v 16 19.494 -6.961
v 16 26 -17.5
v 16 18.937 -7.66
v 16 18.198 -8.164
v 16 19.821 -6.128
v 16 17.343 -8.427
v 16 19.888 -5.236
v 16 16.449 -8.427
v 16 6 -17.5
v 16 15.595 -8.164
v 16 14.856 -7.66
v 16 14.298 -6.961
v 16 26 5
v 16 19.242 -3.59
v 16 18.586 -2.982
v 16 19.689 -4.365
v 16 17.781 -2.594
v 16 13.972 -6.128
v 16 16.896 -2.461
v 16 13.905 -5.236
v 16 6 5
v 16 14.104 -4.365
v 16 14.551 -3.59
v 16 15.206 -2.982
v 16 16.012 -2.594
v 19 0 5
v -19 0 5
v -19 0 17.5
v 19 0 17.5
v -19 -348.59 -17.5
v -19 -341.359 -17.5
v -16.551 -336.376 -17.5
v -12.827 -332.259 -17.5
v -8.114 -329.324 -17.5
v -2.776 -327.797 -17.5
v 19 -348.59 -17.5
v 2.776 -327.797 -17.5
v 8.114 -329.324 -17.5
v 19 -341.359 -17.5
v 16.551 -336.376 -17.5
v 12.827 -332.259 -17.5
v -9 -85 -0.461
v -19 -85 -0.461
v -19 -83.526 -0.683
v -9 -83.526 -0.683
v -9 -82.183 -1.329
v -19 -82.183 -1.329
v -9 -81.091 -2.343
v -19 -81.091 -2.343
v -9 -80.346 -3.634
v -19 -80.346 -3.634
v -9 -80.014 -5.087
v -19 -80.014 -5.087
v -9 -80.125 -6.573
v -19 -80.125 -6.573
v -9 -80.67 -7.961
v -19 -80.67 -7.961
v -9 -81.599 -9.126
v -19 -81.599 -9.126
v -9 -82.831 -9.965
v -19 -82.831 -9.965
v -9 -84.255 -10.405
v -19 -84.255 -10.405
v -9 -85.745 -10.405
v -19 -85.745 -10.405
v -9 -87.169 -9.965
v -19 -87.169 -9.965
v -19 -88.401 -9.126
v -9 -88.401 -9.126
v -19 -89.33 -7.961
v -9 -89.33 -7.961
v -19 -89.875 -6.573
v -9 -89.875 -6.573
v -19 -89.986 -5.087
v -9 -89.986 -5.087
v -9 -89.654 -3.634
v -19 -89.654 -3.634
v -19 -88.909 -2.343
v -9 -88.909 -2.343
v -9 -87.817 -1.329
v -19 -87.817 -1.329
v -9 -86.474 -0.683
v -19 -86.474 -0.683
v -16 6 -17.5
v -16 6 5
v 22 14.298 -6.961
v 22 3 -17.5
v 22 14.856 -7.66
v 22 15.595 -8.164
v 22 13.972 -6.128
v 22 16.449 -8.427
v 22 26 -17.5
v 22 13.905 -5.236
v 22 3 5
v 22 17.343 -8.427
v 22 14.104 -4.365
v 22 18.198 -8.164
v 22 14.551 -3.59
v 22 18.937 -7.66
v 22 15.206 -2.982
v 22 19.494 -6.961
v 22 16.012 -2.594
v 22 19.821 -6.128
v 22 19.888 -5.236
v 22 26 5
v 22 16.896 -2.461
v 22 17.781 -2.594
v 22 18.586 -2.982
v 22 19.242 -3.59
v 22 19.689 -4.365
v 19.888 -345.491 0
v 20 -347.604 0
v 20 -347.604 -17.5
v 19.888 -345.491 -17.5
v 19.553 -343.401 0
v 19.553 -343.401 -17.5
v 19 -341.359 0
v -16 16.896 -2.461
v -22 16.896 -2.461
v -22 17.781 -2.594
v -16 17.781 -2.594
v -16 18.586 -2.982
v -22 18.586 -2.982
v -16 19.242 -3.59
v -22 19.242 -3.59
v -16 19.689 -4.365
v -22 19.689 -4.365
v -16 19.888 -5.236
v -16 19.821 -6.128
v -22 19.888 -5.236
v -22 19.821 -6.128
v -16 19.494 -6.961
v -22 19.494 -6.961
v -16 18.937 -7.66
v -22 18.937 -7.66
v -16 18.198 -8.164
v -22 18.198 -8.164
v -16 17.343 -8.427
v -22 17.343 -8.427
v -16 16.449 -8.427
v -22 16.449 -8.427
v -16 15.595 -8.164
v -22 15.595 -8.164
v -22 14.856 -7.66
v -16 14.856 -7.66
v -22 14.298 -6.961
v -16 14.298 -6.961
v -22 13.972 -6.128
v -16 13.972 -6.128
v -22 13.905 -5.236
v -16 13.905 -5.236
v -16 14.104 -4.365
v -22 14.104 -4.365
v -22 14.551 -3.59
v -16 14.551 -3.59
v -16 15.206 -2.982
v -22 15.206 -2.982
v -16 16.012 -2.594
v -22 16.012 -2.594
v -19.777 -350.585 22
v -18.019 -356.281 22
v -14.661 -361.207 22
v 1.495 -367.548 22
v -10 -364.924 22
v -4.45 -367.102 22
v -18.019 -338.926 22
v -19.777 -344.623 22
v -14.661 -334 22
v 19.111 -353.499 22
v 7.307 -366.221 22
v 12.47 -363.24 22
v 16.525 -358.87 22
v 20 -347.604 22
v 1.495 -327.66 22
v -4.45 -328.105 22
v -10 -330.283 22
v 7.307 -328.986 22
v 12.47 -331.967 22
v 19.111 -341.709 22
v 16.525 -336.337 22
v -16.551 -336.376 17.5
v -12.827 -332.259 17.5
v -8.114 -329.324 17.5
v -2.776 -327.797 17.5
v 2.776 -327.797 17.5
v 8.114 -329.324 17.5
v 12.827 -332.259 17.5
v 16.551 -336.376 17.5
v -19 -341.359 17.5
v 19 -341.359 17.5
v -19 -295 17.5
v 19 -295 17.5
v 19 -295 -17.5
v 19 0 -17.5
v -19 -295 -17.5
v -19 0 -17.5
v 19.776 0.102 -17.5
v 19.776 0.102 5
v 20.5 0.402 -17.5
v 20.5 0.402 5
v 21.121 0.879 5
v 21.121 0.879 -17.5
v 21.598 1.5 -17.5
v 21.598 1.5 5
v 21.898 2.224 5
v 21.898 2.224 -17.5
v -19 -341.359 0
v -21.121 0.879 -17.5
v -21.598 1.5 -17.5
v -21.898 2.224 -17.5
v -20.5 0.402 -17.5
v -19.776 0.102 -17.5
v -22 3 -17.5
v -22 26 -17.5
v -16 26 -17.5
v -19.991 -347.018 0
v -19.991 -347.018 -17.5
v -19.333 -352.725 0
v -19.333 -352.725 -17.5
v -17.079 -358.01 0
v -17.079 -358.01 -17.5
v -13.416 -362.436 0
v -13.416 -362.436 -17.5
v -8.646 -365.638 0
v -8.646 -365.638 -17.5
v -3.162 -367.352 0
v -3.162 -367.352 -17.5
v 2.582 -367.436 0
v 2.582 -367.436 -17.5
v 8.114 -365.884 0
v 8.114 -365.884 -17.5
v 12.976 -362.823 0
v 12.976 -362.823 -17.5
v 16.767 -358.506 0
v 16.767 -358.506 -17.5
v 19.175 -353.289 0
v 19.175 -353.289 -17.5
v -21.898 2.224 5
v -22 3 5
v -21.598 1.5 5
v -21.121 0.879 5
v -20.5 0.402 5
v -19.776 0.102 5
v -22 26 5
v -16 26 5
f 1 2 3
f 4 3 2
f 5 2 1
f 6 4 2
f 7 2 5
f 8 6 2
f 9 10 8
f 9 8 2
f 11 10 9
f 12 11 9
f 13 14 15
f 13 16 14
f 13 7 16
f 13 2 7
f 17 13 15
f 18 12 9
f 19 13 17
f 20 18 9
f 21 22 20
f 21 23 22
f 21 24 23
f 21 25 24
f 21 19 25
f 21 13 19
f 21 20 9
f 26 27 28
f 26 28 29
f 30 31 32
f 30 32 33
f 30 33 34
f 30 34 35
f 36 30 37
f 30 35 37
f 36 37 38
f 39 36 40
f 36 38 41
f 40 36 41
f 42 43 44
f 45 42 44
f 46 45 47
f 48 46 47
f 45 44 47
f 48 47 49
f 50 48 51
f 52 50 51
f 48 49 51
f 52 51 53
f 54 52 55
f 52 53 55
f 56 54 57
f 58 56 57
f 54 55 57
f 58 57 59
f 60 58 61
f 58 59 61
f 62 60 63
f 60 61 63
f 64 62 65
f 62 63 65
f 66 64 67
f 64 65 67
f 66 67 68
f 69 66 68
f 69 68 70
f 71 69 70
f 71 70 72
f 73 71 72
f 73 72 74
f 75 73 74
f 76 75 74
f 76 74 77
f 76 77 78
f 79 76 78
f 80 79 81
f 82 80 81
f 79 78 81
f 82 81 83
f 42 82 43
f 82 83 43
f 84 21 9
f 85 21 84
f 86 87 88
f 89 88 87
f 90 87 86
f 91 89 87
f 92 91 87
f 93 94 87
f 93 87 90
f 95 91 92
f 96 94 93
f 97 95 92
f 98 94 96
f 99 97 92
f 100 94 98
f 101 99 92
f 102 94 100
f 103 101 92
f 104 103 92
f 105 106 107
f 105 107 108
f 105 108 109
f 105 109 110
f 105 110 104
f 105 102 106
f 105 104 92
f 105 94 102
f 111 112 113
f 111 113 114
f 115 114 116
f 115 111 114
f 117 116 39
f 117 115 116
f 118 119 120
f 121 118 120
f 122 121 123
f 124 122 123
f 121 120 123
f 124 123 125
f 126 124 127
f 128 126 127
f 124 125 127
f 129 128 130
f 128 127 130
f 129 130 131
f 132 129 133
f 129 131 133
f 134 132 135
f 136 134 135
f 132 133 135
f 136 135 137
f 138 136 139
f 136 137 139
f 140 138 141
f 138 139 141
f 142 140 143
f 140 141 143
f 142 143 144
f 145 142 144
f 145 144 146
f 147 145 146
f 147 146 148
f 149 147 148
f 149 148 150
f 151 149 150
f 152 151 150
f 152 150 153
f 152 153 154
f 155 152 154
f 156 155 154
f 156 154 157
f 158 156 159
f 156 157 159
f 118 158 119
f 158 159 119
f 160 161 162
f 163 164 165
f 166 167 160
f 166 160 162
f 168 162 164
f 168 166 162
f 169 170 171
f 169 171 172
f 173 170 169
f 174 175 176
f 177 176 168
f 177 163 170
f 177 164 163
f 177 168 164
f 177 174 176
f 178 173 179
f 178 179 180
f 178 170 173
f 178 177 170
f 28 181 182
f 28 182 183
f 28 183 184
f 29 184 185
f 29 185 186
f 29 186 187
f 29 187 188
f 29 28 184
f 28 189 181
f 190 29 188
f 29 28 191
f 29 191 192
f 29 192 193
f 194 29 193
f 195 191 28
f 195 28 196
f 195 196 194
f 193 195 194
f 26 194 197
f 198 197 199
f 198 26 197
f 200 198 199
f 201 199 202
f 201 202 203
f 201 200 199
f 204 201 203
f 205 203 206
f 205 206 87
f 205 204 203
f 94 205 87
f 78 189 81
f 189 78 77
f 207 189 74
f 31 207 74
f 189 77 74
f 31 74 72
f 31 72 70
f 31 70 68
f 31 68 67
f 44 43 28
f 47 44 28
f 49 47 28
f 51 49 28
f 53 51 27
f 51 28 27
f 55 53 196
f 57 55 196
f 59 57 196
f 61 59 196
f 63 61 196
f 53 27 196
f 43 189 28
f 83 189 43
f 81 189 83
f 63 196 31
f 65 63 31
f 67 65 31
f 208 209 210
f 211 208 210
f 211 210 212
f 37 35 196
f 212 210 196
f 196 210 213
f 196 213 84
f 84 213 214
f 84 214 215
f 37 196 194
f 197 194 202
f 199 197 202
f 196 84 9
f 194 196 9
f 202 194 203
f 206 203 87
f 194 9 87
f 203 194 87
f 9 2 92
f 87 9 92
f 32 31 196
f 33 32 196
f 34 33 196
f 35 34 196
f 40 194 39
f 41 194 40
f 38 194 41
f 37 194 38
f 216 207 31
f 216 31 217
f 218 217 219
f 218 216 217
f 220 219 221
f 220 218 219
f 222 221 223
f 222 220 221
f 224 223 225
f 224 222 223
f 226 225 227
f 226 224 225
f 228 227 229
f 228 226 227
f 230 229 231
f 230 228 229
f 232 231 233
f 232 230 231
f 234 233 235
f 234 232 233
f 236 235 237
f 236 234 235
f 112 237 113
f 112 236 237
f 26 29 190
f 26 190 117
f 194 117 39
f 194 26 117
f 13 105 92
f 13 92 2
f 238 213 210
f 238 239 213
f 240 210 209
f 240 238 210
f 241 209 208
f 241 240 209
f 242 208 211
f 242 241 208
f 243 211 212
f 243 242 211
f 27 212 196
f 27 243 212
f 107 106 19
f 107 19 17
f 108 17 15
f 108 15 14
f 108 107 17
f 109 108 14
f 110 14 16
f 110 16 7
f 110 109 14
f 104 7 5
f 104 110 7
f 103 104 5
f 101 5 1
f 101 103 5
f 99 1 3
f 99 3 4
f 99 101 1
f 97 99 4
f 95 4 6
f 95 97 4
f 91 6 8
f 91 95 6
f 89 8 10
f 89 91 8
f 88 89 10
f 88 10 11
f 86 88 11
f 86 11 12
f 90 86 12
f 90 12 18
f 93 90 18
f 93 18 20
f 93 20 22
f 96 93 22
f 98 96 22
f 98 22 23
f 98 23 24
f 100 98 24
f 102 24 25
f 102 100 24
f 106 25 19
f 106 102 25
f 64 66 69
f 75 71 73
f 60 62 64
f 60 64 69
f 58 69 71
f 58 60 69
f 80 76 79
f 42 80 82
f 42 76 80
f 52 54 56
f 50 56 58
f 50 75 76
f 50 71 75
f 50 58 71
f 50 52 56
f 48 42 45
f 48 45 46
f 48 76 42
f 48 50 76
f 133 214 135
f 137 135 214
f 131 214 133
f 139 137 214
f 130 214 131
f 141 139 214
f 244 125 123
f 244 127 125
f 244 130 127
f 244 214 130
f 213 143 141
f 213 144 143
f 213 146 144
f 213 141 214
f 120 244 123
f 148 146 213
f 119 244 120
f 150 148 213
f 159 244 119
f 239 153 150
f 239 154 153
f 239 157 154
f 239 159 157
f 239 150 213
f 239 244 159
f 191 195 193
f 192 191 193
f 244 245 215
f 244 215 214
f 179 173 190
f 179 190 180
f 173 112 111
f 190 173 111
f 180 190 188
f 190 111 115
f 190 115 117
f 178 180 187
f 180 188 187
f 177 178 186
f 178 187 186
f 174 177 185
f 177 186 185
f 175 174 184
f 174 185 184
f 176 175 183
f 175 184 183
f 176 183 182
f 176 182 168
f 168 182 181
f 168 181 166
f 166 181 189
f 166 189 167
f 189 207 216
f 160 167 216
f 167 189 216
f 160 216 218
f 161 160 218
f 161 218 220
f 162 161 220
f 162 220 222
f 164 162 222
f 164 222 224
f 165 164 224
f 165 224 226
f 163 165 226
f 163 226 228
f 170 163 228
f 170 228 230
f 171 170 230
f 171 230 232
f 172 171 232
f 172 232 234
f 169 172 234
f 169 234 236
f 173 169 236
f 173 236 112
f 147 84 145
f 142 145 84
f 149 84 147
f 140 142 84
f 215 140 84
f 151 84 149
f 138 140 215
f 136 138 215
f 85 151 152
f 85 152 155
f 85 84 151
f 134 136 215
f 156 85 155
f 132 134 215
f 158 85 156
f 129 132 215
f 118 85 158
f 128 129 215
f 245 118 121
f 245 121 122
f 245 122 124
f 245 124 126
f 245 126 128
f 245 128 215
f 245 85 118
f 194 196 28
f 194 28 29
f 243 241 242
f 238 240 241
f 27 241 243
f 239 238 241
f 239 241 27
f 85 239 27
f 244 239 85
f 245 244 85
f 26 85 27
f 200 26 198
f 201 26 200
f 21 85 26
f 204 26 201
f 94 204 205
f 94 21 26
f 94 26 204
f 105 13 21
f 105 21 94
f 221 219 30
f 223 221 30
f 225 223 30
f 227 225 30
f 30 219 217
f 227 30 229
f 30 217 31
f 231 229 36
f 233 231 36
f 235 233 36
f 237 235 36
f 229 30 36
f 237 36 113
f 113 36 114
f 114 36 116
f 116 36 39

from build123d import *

# Parameters (mm, degrees)
SKETCH1_W                = 38
SKETCH1_H                = 35
BOSS_EXTRUDE1_DEPTH      = 295
BOSS_EXTRUDE3_DEPTH      = 5
BOSS_EXTRUDE3_DEPTH_BACK = 17.5
SKETCH1_3_W              = 38
SKETCH1_3_H              = 35
BOSS_EXTRUDE6_DEPTH      = 348.59
CUT_EXTRUDE1_START       = -6
SKETCH3_R                = 3
CUT_EXTRUDE1_DEPTH       = 6
SKETCH5_R                = 20
BOSS_EXTRUDE8_DEPTH      = 22
BOSS_EXTRUDE8_DEPTH_BACK = 17.5
SKETCH8_R                = 5
CUT_EXTRUDE2_DEPTH       = 10


with BuildPart() as part:
    # Sketch1 → Boss-Extrude1 (new body)
    with BuildSketch(Plane(origin=(0, 0, 0), x_dir=(1, 0, 0), z_dir=(0, 1, 0))):
        Rectangle(SKETCH1_W, SKETCH1_H)
    extrude(amount=-BOSS_EXTRUDE1_DEPTH)


with BuildPart() as body_2:
    # Sketch2 → Boss-Extrude3 (new body, two sides)
    with BuildSketch(Plane.XY) as boss_extrude3_sk:
        with BuildLine():
            Line((-19, 0), (19, 0))
            ThreePointArc((19, 0), (21.121320344, 0.878679656), (22, 3))
            Line((22, 3), (22, 26))
            Line((22, 26), (16, 26))
            Line((16, 26), (16, 6))
            Line((16, 6), (-16, 6))
            Line((-16, 6), (-16, 26))
            Line((-16, 26), (-22, 26))
            Line((-22, 26), (-22, 3))
            ThreePointArc((-22, 3), (-21.121320344, 0.878679656), (-19, 0))
        make_face()
    extrude(amount=BOSS_EXTRUDE3_DEPTH)
    extrude(boss_extrude3_sk.sketch, amount=-BOSS_EXTRUDE3_DEPTH_BACK)

    # Sketch1<3> → Boss-Extrude6 (add)
    with BuildSketch(Plane(origin=(0, 0, 0), x_dir=(1, 0, 0), z_dir=(0, 1, 0))):
        Rectangle(SKETCH1_3_W, SKETCH1_3_H)
    extrude(amount=-BOSS_EXTRUDE6_DEPTH)

    # Sketch3 → Cut-Extrude1 (cut)
    with BuildSketch(Plane.ZY.offset(-16).offset(CUT_EXTRUDE1_START)):
        with Locations((-5.46063237, 16.89632523)):
            Circle(SKETCH3_R)
    cut_extrude1 = extrude(amount=CUT_EXTRUDE1_DEPTH, mode=Mode.SUBTRACT)

    # Mirror1: Cut-Extrude1 across plane
    add(cut_extrude1.mirror(Plane(origin=(0, 0, 0), x_dir=(0, 0, 1), z_dir=(1, 0, 0))), mode=Mode.SUBTRACT)

    # Sketch5 → Boss-Extrude8 (add, two sides)
    with BuildSketch(Plane.XY) as boss_extrude8_sk:
        with Locations((0, -347.60367477)):
            Circle(SKETCH5_R)
    extrude(amount=BOSS_EXTRUDE8_DEPTH)
    extrude(boss_extrude8_sk.sketch, amount=-BOSS_EXTRUDE8_DEPTH_BACK)

    # Sketch8 → Cut-Extrude2 (cut)
    with BuildSketch(Plane.ZY.offset(19)):
        with Locations((-5.46063237, -85)):
            Circle(SKETCH8_R)
    extrude(amount=-CUT_EXTRUDE2_DEPTH, mode=Mode.SUBTRACT)


solid = Compound([part.part, body_2.part])
